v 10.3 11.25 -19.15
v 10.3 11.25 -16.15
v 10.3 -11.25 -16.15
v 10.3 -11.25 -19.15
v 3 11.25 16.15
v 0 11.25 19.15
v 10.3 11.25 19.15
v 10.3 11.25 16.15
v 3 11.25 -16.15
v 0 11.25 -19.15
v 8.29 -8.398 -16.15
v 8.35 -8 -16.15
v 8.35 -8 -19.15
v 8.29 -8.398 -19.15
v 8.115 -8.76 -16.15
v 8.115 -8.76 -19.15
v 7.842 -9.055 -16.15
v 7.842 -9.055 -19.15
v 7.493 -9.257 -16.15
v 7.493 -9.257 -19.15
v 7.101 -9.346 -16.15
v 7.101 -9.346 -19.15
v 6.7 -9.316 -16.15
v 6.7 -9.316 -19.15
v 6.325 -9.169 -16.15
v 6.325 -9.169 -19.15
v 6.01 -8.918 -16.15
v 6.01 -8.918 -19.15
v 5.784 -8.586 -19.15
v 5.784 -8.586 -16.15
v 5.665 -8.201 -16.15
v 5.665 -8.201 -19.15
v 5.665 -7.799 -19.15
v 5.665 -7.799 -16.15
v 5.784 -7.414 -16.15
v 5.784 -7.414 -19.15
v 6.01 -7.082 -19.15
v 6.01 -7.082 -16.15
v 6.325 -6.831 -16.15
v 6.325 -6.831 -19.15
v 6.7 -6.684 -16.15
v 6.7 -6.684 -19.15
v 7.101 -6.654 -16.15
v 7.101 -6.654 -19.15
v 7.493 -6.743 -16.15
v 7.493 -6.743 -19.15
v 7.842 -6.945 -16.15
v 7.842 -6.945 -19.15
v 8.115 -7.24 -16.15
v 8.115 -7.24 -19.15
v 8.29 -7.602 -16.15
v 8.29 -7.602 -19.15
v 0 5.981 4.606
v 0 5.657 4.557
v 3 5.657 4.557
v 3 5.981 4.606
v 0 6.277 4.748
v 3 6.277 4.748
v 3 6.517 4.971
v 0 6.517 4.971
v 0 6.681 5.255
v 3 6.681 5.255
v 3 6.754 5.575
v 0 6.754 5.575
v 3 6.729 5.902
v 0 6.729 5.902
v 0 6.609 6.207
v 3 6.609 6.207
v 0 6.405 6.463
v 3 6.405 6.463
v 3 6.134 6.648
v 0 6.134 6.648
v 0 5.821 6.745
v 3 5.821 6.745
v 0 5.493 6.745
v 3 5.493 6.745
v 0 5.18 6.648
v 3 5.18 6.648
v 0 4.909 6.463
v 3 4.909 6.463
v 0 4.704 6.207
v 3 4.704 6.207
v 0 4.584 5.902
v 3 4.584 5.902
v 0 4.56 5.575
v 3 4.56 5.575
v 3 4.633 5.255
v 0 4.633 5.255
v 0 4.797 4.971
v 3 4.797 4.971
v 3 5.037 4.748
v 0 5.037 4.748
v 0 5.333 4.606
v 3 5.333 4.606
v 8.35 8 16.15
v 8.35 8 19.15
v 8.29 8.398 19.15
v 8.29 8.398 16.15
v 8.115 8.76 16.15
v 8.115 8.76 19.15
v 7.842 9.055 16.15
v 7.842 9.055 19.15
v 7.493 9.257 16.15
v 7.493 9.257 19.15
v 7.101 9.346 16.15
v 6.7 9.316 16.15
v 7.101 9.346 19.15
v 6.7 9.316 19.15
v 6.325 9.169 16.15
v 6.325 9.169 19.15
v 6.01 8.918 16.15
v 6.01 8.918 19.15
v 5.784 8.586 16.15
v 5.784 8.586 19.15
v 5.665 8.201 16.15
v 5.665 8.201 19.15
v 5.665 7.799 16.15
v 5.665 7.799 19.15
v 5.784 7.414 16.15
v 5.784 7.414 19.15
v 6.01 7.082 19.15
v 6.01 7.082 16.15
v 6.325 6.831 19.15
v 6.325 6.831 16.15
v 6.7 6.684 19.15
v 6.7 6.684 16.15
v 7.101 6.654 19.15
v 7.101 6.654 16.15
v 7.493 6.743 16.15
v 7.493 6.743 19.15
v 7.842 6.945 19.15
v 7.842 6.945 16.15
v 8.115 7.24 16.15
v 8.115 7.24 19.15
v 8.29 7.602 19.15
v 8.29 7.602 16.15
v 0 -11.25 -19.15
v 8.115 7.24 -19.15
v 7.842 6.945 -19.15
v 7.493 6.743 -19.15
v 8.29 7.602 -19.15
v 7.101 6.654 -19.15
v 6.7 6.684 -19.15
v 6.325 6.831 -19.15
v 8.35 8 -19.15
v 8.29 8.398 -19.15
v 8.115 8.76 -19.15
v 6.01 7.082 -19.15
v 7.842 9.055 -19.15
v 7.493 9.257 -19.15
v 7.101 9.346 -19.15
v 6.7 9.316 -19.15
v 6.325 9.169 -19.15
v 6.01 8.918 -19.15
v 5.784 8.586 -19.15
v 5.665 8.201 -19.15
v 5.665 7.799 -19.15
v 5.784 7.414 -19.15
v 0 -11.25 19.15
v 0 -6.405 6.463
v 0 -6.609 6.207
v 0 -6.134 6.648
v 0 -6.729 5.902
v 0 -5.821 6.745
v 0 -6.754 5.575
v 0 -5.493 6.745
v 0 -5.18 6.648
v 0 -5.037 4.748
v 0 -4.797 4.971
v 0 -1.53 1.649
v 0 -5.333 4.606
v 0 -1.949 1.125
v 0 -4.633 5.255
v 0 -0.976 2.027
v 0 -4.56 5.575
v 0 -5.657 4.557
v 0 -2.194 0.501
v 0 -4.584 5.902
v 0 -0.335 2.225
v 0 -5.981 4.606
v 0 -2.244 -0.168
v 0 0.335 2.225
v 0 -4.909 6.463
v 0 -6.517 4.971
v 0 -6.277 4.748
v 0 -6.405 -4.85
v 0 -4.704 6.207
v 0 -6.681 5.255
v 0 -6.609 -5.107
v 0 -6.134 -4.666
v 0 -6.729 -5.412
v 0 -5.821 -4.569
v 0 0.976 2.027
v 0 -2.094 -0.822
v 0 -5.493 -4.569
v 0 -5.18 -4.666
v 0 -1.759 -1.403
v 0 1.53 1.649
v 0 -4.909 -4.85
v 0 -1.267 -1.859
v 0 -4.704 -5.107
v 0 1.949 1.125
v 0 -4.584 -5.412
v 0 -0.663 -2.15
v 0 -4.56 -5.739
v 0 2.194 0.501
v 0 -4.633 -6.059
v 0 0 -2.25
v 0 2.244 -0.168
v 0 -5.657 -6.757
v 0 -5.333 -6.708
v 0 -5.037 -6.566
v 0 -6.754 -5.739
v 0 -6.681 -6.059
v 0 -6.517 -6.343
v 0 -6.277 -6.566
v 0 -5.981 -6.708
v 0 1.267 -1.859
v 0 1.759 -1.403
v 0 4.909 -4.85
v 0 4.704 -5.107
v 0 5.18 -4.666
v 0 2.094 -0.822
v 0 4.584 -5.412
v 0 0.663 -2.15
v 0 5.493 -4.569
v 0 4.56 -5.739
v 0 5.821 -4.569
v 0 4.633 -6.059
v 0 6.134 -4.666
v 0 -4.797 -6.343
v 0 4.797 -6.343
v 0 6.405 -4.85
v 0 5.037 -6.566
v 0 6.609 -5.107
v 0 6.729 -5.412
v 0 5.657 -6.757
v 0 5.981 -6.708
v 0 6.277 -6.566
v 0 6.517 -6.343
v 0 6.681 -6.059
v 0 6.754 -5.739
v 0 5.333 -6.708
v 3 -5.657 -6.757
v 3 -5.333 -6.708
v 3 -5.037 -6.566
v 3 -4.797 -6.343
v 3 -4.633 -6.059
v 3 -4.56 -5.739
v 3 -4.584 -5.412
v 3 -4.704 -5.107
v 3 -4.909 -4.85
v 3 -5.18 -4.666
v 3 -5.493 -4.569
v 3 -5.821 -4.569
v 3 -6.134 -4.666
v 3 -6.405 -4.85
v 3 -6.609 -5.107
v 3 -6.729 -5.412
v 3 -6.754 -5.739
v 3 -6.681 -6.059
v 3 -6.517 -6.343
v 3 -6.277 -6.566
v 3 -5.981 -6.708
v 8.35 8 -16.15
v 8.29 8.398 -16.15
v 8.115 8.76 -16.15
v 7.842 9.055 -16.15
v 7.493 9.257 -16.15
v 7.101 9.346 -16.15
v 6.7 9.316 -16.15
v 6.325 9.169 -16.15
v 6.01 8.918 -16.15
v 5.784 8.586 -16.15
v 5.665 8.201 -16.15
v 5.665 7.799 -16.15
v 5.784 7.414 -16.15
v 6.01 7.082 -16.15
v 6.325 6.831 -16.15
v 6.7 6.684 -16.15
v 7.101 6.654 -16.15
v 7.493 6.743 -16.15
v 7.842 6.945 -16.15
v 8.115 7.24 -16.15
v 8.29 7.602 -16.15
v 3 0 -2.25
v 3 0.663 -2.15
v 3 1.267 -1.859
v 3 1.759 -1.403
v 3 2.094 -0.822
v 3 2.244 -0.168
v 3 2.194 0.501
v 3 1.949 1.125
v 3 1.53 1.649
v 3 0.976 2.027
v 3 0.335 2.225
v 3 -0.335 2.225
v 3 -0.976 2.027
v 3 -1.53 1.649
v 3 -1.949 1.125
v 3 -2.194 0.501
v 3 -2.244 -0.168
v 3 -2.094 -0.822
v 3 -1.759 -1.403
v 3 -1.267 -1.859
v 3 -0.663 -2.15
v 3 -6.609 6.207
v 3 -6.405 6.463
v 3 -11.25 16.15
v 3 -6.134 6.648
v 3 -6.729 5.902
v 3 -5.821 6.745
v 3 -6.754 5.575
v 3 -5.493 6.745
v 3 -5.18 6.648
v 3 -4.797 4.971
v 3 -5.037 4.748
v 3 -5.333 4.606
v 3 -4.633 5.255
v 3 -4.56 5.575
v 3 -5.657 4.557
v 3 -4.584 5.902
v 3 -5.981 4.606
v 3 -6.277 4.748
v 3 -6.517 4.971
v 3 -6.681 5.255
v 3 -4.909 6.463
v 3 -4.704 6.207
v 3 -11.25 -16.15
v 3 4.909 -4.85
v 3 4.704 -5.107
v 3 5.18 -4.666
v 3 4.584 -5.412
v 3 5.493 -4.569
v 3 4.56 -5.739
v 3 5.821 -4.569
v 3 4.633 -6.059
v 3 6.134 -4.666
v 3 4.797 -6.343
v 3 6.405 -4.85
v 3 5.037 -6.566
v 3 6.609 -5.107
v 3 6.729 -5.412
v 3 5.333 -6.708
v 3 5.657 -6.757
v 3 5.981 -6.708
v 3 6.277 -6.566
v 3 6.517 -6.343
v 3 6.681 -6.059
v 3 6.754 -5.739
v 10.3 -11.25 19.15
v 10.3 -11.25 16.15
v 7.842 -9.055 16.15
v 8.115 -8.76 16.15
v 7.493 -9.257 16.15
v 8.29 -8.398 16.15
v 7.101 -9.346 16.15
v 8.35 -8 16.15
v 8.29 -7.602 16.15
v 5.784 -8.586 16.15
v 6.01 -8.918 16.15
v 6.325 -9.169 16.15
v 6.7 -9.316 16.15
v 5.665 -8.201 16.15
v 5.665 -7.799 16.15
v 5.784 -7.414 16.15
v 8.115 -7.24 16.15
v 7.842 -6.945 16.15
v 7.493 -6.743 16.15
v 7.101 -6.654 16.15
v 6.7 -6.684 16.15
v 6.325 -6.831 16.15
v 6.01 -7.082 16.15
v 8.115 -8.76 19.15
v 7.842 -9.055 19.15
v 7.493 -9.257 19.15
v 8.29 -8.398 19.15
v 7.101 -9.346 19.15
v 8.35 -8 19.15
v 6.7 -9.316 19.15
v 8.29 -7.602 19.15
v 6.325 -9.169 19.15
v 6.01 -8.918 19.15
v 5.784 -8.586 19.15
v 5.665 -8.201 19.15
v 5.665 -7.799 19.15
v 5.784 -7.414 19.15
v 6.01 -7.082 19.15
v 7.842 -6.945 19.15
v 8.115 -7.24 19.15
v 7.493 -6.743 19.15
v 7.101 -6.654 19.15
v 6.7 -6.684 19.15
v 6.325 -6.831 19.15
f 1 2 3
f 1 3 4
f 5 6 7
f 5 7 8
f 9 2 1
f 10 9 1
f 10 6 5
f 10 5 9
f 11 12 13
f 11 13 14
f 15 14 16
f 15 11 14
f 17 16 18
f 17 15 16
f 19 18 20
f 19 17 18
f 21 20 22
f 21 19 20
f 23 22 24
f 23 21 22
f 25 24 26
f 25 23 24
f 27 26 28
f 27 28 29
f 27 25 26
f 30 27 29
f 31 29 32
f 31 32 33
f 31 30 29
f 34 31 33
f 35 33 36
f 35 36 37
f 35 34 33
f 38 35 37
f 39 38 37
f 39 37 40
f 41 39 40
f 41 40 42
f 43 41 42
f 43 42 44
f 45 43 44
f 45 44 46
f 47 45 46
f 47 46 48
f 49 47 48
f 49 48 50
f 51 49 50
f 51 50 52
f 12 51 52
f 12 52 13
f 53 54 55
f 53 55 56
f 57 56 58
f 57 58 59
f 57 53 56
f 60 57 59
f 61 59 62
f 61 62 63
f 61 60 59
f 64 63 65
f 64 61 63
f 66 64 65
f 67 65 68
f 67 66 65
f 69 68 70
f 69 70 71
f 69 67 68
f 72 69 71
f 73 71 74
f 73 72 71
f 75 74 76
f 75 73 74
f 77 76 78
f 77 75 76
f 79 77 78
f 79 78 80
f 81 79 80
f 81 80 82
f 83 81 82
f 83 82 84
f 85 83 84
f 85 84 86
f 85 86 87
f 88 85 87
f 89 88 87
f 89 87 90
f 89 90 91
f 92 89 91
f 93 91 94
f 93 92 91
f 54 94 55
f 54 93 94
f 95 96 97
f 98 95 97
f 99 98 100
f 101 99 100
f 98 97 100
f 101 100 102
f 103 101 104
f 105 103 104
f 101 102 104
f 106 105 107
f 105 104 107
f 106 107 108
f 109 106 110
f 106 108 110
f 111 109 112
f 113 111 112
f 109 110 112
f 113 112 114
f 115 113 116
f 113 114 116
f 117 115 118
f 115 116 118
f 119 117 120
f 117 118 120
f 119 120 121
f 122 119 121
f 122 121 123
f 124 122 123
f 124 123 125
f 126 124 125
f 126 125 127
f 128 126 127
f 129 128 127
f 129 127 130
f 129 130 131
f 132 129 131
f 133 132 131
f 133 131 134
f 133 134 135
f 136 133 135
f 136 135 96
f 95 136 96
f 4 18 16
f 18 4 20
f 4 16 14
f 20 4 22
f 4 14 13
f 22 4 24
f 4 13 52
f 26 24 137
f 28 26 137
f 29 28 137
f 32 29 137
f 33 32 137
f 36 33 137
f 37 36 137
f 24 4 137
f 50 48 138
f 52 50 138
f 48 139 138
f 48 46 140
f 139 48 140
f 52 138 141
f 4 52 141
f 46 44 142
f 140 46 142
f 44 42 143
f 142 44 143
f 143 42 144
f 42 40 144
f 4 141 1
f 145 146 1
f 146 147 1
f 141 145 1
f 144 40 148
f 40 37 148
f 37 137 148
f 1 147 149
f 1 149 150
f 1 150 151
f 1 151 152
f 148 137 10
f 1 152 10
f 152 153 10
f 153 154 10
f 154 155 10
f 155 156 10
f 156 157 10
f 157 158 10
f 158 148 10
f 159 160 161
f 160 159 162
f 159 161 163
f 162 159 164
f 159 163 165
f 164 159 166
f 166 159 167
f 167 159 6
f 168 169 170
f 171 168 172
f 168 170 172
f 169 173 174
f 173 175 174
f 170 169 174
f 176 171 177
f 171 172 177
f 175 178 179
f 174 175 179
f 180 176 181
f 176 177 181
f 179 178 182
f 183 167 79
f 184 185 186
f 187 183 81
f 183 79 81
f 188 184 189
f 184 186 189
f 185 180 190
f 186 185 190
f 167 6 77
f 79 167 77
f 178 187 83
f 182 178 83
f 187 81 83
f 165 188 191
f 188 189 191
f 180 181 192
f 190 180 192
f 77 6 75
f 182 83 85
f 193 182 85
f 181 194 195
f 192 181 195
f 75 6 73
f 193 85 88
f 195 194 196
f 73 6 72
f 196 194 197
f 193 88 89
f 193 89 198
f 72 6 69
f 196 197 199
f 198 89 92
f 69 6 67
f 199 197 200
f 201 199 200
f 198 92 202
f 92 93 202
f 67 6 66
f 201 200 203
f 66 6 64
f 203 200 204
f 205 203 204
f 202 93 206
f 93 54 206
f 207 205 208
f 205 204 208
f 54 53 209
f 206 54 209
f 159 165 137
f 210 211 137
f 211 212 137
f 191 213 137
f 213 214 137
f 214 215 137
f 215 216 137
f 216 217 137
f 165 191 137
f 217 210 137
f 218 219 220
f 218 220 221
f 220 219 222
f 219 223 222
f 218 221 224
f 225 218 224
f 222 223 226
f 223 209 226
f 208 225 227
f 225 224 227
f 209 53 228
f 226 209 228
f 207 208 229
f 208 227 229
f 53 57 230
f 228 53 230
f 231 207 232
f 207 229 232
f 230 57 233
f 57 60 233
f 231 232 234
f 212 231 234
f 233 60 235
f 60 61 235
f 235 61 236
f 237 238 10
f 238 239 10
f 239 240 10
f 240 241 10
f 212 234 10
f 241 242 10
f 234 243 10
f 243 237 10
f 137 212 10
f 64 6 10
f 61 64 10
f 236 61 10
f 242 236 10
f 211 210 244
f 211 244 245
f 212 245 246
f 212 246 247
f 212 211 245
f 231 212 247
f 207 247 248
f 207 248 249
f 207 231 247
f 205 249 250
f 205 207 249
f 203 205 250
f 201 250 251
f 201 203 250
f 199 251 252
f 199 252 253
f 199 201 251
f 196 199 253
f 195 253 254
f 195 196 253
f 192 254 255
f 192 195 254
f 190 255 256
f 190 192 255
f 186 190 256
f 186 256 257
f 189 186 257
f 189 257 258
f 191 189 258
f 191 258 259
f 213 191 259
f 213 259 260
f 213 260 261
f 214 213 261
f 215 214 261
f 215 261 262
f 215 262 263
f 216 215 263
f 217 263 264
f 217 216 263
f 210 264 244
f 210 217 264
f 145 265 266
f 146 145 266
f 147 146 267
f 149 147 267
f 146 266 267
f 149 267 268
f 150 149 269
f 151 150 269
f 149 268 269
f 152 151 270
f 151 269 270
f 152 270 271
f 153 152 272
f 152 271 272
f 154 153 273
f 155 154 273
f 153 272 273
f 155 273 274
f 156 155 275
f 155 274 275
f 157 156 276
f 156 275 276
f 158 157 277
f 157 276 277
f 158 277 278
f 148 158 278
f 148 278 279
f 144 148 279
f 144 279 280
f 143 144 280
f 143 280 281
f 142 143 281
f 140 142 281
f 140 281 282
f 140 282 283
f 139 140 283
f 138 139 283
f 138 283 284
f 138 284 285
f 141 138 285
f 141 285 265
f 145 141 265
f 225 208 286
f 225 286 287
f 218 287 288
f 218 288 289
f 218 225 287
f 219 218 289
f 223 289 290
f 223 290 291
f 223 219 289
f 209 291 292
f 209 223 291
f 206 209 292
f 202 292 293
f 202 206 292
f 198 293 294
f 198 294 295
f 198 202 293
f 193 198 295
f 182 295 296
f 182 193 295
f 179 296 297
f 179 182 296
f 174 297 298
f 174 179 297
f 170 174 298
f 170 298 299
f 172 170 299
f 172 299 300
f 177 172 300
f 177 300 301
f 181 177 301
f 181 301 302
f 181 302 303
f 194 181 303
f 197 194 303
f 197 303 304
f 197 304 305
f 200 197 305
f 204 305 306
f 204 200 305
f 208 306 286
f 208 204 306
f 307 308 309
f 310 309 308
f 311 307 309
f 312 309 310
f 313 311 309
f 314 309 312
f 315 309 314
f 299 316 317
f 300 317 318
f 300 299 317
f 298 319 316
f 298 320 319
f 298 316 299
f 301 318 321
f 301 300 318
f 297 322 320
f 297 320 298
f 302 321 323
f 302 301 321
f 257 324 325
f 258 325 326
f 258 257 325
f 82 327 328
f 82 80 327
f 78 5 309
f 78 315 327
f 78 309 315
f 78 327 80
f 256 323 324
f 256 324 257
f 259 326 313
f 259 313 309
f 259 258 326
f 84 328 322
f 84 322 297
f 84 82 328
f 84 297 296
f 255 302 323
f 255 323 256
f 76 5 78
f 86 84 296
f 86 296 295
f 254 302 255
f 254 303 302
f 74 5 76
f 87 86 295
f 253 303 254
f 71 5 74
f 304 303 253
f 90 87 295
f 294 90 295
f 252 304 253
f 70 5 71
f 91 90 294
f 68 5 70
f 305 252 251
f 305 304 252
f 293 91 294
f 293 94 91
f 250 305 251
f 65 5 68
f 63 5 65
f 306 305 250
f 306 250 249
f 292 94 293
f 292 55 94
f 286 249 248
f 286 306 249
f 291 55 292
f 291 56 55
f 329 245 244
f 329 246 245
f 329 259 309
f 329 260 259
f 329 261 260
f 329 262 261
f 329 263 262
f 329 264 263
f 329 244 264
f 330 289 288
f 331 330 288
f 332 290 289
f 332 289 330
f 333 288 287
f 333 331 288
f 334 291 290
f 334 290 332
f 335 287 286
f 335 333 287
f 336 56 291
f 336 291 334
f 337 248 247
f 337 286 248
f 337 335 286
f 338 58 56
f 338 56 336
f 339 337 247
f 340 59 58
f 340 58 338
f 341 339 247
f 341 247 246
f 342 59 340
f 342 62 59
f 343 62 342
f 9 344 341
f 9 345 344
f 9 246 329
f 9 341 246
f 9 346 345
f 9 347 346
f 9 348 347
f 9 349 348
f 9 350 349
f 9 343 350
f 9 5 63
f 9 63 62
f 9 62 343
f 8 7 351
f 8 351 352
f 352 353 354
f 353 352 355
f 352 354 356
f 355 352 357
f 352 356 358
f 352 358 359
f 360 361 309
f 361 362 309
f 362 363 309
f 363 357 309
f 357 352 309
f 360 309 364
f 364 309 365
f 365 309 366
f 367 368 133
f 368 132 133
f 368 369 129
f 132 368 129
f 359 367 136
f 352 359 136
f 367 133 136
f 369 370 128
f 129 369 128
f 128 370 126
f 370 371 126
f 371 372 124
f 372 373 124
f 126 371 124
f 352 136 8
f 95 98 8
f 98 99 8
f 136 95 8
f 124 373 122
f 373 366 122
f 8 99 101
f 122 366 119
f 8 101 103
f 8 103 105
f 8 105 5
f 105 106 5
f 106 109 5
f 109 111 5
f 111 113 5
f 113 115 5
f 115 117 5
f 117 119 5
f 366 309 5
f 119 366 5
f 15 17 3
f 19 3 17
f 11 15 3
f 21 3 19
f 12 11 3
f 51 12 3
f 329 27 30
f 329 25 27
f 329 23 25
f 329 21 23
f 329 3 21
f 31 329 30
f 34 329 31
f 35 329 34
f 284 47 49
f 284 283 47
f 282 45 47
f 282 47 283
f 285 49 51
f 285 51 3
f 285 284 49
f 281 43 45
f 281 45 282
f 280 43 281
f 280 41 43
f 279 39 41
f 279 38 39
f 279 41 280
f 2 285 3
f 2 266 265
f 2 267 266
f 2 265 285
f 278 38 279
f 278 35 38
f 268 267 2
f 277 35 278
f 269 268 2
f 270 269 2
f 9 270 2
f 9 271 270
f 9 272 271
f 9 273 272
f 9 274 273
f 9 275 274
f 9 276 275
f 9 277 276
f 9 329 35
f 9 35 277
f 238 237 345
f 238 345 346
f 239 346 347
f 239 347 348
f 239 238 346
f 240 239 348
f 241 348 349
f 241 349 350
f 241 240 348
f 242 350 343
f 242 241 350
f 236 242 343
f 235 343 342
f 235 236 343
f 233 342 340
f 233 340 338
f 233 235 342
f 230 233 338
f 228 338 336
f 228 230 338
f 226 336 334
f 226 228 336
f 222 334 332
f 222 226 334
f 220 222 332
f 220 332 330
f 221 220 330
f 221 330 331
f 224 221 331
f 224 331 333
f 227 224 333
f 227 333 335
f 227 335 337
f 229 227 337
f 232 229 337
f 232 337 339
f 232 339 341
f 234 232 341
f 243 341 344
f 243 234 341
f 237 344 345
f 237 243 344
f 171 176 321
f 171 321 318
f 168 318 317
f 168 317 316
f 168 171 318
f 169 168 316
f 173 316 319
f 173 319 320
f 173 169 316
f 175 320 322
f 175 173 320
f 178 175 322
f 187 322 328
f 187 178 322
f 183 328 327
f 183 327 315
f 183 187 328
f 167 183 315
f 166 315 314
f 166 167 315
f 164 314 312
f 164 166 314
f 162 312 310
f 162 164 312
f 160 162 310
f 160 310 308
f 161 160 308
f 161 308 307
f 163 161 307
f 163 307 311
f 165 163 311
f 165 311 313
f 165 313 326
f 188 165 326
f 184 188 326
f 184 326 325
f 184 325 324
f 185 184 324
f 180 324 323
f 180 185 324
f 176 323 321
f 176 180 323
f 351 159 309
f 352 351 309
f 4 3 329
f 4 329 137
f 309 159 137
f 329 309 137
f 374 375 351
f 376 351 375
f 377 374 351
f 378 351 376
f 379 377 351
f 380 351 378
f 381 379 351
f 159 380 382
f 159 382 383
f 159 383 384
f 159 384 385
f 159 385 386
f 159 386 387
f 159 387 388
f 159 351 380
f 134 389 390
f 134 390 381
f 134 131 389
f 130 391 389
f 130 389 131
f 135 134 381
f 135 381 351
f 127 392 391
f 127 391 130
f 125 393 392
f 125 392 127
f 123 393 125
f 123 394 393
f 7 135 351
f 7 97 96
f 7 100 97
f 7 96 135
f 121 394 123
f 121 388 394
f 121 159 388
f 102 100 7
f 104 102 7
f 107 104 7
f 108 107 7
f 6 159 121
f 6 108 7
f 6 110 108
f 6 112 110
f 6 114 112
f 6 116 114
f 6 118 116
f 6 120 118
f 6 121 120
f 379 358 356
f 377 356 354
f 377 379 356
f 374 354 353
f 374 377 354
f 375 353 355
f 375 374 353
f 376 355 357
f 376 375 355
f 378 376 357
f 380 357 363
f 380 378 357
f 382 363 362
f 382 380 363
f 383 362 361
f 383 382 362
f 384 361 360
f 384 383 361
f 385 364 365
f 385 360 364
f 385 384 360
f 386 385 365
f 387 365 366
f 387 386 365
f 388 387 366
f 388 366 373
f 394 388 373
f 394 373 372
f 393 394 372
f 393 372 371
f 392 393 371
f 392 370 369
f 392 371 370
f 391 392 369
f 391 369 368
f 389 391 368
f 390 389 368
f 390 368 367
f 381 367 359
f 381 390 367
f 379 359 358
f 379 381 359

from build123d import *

# Parameters (mm, degrees)
SKETCH1_W           = 32.3
SKETCH1_H           = 22.5
SKETCH1_R           = 1.1
SKETCH1_R_2         = 2.25
BOSS_EXTRUDE1_DEPTH = 3
SKETCH1_5_W         = 3
SKETCH1_5_H         = 22.5
BOSS_EXTRUDE5_DEPTH = 10.3
CUT_EXTRUDE1_REACH  = 43.226
SKETCH2_R           = 1.35


with BuildPart() as part:
    # Sketch1 → Boss-Extrude1 (new body)
    with BuildSketch(Plane(origin=(0, 0, 0), x_dir=(0, 0, -1), z_dir=(1, 0, 0))):
        Rectangle(SKETCH1_W, SKETCH1_H)
        with Locations((-5.656854249, -5.656854249)):
            Circle(SKETCH1_R, mode=Mode.SUBTRACT)
        with Locations((5.656854249, -5.656854249)):
            Circle(SKETCH1_R, mode=Mode.SUBTRACT)
        Circle(SKETCH1_R_2, mode=Mode.SUBTRACT)
        with Locations((-5.656854249, 5.656854249)):
            Circle(SKETCH1_R, mode=Mode.SUBTRACT)
        with Locations((5.656854249, 5.656854249)):
            Circle(SKETCH1_R, mode=Mode.SUBTRACT)
    extrude(amount=BOSS_EXTRUDE1_DEPTH)

    # Sketch1<5> → Boss-Extrude5 (add)
    with BuildSketch(Plane(origin=(0, 0, 0), x_dir=(0, 0, -1), z_dir=(1, 0, 0))):
        with Locations((17.65, 0)):
            Rectangle(SKETCH1_5_W, SKETCH1_5_H)
        with Locations((-17.65, 0)):
            Rectangle(SKETCH1_5_W, SKETCH1_5_H)
    extrude(amount=BOSS_EXTRUDE5_DEPTH)

    # Cut-Extrude1: up to this face of the body (flat: up to its plane)
    cut_extrude1_end = Plane(part.part.faces().sort_by_distance((5.15, 0, -19.15))[0])
    # Sketch2 → Cut-Extrude1 (cut, up to the picked face)
    with BuildSketch(Plane.XY.offset(19.15), mode=Mode.PRIVATE) as cut_extrude1_sk1:
        with Locations((7, 8)):
            Circle(SKETCH2_R)
    cut_extrude1_tool1 = split(extrude(cut_extrude1_sk1.sketch, amount=-CUT_EXTRUDE1_REACH, mode=Mode.PRIVATE), bisect_by=cut_extrude1_end, keep=Keep.BOTH, mode=Mode.PRIVATE)
    cut_extrude1 = cut_extrude1_tool1.solids().sort_by(Axis((7, 8, 19.15), (0, 0, -1)))[0]
    add(cut_extrude1, mode=Mode.SUBTRACT)

    # Mirror1: Cut-Extrude1 across plane
    add(cut_extrude1.mirror(Plane.ZX), mode=Mode.SUBTRACT)


solid = part.part
